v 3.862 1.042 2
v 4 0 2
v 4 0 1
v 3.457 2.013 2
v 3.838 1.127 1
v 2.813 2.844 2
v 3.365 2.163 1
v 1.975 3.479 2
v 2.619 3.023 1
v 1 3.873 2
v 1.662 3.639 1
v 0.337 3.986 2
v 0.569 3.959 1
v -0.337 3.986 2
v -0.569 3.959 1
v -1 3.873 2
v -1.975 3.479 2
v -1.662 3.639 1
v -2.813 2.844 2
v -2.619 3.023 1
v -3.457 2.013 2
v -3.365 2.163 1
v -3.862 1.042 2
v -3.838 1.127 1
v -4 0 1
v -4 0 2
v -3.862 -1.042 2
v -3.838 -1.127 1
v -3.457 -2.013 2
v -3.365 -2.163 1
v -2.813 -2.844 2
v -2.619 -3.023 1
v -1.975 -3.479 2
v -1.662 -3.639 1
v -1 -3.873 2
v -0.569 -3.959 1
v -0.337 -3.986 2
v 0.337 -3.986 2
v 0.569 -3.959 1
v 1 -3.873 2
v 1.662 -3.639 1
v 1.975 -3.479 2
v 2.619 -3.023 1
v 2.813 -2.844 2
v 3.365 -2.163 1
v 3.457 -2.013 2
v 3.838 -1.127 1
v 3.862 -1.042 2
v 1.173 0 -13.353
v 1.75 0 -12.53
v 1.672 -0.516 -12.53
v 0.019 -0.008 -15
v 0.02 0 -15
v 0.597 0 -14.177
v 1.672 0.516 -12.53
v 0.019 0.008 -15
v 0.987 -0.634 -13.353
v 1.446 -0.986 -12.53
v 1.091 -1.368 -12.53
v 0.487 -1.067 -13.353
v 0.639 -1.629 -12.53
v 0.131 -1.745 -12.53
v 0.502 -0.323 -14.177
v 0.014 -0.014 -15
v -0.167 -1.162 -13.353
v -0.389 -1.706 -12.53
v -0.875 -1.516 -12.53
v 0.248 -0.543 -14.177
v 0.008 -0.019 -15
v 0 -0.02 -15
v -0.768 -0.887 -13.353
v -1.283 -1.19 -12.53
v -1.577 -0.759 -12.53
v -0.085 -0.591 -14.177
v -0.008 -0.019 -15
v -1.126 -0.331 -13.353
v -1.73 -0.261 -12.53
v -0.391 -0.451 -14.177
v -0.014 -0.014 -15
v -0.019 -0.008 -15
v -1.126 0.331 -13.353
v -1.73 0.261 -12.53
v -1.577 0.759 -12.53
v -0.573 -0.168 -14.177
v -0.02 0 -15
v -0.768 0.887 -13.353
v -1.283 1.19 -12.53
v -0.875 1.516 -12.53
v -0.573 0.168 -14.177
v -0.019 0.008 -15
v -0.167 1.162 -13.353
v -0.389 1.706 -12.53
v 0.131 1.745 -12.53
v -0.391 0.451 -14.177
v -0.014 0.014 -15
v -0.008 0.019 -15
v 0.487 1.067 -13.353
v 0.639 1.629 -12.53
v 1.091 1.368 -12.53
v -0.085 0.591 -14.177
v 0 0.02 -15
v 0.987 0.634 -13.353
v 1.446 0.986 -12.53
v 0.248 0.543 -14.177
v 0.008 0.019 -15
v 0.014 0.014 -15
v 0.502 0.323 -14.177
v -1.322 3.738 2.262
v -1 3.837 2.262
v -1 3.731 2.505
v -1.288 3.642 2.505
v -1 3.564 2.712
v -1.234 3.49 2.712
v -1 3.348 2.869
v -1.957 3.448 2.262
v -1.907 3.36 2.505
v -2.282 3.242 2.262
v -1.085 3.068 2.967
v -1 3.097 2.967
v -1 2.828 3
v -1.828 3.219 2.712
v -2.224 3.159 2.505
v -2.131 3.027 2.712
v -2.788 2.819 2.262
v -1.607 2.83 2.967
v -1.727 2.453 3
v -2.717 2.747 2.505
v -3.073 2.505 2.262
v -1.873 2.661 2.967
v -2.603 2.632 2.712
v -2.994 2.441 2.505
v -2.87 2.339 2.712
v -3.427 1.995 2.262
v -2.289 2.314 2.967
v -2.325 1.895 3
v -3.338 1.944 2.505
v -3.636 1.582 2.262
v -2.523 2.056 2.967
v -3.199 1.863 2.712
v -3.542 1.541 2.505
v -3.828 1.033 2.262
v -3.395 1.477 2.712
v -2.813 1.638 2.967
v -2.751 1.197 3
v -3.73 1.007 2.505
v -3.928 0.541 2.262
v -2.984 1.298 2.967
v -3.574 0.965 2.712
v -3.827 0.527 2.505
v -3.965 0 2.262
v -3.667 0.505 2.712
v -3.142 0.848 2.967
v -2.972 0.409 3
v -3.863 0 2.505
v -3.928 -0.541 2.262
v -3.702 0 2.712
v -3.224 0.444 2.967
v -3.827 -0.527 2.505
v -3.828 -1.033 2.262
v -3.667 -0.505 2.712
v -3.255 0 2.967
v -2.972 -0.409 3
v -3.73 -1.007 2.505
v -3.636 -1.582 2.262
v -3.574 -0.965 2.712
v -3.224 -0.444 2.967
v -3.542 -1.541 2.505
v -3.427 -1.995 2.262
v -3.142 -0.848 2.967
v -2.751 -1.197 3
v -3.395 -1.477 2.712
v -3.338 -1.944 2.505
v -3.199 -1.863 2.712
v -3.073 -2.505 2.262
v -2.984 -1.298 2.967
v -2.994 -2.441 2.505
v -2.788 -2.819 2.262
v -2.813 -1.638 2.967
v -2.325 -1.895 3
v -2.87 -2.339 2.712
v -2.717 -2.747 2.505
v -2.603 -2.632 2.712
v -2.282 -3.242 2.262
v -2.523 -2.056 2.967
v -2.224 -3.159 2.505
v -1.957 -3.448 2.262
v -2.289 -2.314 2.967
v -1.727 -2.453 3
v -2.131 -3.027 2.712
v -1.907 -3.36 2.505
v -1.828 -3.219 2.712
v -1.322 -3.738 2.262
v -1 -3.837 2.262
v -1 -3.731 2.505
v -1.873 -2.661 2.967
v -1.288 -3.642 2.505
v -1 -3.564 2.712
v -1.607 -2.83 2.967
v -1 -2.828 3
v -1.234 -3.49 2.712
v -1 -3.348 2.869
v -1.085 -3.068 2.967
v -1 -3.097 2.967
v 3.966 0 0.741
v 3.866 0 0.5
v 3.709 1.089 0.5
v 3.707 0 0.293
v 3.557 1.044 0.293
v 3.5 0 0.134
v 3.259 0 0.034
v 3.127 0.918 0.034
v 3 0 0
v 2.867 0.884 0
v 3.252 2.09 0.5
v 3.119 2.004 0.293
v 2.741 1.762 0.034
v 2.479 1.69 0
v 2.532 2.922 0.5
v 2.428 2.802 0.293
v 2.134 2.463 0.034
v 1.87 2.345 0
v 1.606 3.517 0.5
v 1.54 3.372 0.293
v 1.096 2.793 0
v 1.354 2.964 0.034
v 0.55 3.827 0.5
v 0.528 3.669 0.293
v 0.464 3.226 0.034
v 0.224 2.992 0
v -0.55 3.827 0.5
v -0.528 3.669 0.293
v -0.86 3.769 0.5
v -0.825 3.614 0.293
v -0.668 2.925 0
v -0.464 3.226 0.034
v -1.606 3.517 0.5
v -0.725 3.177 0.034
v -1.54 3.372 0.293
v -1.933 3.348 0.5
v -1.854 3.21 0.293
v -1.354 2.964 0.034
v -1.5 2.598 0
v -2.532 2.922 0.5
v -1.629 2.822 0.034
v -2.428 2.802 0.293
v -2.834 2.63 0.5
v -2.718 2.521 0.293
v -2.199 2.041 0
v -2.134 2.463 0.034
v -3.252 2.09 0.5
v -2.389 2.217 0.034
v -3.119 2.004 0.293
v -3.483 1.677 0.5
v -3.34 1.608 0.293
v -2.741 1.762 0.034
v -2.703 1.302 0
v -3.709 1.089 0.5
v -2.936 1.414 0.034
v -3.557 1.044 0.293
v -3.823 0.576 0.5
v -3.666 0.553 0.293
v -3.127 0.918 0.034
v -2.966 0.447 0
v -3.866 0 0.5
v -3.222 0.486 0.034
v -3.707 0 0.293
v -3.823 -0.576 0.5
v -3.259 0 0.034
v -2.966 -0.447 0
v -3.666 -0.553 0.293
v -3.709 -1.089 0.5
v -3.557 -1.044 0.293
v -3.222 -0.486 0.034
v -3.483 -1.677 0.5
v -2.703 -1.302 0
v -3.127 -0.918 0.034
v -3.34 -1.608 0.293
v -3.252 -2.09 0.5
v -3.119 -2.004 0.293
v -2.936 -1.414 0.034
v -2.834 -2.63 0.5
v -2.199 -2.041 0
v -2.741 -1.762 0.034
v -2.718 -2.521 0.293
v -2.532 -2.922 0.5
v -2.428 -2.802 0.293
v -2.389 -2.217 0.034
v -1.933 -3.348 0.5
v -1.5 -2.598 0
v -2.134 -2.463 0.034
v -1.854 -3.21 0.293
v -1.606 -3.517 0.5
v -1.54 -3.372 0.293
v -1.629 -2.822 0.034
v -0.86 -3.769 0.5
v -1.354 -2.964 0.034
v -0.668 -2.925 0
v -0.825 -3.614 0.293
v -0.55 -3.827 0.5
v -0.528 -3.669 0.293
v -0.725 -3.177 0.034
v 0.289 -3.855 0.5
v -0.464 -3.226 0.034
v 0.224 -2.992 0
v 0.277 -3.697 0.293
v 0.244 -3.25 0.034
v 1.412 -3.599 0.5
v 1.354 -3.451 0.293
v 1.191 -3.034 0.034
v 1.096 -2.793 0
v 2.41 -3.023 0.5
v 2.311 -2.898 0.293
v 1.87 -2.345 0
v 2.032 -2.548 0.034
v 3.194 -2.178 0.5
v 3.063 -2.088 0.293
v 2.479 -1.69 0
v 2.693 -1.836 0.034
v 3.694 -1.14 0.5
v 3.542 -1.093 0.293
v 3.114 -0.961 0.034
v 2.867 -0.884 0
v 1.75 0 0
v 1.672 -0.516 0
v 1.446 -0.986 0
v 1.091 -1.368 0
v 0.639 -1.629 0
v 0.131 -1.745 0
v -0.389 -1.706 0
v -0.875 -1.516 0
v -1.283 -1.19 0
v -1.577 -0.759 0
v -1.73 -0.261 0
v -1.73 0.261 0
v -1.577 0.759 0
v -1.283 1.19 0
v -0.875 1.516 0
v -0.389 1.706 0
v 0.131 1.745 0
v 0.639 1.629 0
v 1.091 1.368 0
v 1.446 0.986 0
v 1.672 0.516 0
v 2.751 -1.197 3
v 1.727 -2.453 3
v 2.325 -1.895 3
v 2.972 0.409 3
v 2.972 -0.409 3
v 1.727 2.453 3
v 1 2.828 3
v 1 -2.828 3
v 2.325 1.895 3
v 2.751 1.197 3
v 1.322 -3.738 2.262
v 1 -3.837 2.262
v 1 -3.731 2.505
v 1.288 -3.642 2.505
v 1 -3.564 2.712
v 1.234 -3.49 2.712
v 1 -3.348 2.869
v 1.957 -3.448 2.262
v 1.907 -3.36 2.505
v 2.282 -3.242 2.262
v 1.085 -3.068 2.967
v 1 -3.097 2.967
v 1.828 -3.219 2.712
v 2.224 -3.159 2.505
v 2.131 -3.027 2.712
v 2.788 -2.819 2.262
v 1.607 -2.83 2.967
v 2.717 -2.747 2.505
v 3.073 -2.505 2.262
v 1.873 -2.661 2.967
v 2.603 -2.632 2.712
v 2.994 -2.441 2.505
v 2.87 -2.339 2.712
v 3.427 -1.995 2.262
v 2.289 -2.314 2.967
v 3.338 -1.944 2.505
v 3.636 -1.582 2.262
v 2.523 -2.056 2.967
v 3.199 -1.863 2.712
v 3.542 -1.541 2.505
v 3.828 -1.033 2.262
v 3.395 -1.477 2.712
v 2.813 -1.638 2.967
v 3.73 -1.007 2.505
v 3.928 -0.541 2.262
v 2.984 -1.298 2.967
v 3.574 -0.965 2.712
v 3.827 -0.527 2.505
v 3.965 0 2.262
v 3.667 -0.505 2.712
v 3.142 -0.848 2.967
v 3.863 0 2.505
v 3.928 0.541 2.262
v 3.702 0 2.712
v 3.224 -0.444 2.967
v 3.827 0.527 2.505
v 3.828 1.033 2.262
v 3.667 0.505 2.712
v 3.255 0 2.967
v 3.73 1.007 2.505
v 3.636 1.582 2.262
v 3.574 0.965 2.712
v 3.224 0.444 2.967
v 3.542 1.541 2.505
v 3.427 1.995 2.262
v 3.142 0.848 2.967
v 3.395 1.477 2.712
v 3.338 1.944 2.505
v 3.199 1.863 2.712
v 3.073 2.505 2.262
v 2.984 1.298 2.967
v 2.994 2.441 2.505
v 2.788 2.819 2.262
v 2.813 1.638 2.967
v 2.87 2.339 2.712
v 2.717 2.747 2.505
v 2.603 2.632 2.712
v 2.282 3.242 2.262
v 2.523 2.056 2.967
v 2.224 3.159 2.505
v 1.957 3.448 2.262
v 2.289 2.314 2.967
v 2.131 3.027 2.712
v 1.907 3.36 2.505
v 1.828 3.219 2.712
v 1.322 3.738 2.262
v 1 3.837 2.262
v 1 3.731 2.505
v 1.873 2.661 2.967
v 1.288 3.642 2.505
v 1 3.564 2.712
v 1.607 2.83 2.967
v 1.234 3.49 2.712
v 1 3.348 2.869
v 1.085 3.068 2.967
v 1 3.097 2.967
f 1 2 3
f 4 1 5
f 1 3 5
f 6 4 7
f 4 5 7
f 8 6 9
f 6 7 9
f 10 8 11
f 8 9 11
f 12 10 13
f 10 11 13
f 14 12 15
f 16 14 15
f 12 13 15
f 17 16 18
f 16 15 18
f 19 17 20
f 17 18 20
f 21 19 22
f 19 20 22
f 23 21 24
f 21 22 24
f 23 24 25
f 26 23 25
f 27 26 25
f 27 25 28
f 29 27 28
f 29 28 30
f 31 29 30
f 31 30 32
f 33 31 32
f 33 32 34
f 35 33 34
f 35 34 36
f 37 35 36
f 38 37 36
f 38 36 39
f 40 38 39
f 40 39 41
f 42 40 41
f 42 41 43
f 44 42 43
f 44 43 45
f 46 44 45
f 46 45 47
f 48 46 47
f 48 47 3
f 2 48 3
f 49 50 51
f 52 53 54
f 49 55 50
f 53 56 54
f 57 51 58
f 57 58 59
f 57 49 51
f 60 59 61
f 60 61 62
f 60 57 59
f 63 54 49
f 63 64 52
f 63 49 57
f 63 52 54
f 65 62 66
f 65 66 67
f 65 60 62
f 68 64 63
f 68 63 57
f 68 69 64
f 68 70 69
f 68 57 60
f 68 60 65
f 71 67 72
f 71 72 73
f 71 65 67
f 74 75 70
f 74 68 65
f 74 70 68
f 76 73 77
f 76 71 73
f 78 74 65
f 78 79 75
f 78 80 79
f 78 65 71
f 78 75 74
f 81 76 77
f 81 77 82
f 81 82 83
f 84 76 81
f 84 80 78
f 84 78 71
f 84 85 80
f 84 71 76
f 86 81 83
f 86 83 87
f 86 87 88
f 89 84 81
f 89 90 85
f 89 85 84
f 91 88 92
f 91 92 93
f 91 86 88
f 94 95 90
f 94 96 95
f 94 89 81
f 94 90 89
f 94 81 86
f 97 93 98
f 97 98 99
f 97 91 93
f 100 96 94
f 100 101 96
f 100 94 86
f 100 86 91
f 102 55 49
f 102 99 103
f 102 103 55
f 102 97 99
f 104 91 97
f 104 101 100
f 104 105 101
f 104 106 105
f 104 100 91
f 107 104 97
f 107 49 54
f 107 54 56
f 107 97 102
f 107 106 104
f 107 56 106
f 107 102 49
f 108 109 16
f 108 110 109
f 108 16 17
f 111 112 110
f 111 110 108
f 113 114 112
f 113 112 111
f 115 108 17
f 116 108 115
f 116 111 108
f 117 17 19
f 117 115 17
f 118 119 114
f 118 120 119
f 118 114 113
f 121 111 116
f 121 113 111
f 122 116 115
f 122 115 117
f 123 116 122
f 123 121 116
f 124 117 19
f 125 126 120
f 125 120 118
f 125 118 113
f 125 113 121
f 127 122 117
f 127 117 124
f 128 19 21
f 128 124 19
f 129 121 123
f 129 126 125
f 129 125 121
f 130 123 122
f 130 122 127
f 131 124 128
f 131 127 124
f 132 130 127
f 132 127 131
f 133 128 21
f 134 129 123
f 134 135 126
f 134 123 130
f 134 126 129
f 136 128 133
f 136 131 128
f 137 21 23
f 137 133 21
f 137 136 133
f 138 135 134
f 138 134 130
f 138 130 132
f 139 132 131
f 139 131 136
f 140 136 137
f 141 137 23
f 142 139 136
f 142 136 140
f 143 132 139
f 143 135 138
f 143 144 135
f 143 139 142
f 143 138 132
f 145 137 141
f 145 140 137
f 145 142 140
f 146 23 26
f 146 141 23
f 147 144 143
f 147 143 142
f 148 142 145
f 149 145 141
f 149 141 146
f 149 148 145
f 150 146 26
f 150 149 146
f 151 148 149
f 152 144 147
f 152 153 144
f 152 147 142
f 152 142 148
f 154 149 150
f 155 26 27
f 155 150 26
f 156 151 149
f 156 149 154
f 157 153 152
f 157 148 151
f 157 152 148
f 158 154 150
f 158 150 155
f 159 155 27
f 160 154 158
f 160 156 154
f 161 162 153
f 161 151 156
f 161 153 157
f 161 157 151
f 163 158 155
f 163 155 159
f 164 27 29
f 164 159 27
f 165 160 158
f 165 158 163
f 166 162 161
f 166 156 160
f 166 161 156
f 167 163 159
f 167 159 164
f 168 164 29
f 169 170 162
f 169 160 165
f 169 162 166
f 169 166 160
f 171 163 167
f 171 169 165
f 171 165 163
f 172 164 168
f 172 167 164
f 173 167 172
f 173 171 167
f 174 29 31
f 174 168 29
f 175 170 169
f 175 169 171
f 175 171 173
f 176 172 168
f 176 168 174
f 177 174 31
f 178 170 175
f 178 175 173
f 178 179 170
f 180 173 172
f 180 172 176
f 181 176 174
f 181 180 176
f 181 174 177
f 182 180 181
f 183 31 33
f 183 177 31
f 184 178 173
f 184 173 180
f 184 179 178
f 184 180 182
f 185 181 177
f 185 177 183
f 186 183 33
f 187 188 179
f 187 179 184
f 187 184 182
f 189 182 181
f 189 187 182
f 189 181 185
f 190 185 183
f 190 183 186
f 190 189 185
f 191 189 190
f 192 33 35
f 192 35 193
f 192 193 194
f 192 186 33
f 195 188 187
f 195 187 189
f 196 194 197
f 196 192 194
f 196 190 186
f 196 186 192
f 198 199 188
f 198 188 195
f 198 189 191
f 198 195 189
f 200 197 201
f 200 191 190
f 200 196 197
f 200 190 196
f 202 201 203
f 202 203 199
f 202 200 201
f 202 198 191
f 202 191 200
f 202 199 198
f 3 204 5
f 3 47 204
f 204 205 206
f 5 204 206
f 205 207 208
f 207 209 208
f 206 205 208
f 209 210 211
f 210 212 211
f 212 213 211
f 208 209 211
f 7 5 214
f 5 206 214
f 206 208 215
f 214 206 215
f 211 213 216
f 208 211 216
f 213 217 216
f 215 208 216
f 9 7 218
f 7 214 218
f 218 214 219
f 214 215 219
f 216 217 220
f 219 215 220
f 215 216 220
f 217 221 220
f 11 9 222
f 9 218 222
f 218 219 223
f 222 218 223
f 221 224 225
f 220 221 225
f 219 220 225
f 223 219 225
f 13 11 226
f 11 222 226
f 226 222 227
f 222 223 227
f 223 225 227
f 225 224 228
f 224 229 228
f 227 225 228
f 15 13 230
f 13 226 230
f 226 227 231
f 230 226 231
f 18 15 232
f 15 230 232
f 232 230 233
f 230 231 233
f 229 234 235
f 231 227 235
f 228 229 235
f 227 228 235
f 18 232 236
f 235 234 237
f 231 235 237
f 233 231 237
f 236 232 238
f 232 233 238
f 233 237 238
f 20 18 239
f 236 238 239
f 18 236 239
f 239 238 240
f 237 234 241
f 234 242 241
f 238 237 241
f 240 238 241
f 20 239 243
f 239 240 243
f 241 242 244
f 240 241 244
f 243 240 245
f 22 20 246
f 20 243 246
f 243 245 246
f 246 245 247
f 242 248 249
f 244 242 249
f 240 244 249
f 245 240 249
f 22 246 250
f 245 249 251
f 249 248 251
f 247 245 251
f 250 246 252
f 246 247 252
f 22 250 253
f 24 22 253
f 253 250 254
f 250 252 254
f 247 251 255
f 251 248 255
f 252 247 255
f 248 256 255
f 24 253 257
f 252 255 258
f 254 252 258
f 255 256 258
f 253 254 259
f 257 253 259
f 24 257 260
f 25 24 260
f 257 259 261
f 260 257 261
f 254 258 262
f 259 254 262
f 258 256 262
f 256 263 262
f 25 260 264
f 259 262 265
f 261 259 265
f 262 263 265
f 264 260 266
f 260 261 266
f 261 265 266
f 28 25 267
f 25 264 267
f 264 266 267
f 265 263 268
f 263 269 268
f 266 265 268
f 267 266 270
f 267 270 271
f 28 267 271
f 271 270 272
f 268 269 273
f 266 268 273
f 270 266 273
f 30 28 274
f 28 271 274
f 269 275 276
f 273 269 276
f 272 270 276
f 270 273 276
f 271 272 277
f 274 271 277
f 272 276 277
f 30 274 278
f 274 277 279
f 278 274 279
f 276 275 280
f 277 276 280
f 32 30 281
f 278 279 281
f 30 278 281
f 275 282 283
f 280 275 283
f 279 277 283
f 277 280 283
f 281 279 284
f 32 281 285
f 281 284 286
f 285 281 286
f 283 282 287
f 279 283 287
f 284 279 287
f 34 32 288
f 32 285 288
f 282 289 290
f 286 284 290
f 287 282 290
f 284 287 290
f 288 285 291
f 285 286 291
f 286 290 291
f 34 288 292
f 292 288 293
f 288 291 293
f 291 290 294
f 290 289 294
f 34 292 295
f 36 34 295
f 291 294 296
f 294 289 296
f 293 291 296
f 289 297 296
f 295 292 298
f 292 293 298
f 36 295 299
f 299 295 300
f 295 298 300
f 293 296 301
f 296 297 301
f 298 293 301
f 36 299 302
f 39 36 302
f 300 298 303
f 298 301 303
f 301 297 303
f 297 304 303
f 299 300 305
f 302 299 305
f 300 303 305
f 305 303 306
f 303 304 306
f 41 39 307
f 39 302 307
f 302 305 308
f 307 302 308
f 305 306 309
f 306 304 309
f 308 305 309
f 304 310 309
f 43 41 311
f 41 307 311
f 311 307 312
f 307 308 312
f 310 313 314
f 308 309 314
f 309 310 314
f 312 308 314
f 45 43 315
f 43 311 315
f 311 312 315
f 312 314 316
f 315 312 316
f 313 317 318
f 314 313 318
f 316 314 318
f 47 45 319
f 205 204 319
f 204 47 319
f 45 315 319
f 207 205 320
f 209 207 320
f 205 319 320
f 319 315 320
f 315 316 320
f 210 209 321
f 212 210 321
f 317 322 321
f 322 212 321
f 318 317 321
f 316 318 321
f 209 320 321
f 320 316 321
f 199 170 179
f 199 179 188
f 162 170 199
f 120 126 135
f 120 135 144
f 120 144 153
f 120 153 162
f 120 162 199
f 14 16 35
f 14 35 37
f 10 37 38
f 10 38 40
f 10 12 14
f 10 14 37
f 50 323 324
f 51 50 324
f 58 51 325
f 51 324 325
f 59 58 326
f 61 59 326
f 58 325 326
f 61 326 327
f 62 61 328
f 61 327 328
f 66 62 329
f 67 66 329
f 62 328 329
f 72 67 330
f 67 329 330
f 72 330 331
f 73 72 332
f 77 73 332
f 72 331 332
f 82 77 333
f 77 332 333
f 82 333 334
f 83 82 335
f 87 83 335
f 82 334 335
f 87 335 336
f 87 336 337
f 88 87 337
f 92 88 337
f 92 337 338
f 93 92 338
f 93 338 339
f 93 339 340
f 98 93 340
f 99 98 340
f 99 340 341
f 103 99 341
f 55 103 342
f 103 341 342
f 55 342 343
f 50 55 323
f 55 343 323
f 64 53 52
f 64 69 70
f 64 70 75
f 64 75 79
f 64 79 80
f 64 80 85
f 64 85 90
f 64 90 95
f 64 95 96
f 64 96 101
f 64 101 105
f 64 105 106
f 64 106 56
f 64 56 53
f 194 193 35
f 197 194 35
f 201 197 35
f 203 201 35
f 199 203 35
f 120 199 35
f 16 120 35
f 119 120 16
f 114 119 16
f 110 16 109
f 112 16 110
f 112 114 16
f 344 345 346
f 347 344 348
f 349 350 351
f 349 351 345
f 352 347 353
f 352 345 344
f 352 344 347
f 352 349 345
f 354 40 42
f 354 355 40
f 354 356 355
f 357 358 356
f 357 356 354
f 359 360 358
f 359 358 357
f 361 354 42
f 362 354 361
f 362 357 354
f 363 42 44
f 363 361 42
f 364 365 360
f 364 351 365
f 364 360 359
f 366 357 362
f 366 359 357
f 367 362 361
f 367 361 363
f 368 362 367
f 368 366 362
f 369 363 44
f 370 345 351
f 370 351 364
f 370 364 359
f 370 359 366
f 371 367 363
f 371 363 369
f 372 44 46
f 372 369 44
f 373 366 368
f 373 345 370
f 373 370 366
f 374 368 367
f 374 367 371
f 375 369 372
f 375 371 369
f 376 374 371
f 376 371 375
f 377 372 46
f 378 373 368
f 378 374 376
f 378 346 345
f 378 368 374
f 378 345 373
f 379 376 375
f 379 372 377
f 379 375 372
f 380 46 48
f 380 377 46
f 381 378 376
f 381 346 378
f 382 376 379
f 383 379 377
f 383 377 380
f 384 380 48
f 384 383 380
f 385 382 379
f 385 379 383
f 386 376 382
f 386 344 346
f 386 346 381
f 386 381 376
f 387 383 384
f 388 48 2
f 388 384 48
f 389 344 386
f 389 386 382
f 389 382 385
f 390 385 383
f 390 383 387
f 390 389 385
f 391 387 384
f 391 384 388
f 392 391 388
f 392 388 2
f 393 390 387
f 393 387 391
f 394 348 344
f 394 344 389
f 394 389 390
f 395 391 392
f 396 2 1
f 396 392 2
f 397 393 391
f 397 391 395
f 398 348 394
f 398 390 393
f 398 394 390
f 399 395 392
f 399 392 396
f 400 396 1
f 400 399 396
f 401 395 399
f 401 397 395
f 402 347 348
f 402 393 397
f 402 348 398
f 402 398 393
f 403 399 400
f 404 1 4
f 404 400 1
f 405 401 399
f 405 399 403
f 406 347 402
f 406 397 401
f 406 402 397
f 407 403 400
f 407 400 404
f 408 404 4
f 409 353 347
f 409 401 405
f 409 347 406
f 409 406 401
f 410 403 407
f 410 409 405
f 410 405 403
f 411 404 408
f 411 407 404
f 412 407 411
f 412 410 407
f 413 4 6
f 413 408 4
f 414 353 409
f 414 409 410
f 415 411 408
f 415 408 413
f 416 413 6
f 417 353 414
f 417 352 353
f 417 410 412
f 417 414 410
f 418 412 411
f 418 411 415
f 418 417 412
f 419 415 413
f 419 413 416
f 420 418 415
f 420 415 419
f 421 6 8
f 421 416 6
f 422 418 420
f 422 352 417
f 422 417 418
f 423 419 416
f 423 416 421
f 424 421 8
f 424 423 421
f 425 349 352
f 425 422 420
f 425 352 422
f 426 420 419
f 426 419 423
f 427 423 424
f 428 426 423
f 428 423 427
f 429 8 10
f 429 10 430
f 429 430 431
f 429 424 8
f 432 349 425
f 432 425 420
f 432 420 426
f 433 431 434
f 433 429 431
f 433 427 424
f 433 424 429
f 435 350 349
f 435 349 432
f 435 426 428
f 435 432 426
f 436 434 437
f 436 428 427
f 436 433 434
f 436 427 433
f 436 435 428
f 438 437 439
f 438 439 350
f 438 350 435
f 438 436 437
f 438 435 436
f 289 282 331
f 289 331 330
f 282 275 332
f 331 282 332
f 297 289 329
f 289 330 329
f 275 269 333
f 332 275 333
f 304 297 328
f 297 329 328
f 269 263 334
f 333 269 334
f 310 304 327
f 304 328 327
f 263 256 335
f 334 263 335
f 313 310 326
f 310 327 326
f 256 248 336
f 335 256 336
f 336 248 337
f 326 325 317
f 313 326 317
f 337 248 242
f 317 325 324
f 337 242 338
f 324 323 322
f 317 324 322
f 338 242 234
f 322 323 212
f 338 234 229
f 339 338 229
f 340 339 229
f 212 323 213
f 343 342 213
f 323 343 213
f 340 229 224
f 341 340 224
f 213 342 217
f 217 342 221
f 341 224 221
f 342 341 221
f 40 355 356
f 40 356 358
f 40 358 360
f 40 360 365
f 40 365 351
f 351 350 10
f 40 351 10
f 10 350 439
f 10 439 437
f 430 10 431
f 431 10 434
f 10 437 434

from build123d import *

# Parameters (mm, degrees)
CROQUIS1_R              = 4
SALIENTE_EXTRUIR1_DEPTH = 3
REDONDEO1_R             = 1
CROQUIS2_W              = 2
CROQUIS2_H              = 10.515557436
CORTAR_EXTRUIR1_DEPTH   = 1
CROQUIS3_R              = 1.75
SALIENTE_EXTRUIR2_DEPTH = 15
CHAFL_N1_SIZE           = 2.47
CHAFL_N1_SIZE2          = 1.729512619


with BuildPart() as part:
    # Croquis1 → Saliente-Extruir1 (new body)
    with BuildSketch(Plane.XY):
        Circle(CROQUIS1_R)
    extrude(amount=SALIENTE_EXTRUIR1_DEPTH)

    # Redondeo1
    redondeo1_edges = [part.edges().sort_by_distance(p)[0] for p in [
        (-4, 0, 0),
        (-4, 0, 3),
    ]]
    fillet(redondeo1_edges, radius=REDONDEO1_R)

    # Croquis2 → Cortar-Extruir1 (cut)
    with BuildSketch(Plane.XY.offset(3)):
        Rectangle(CROQUIS2_W, CROQUIS2_H)
    extrude(amount=-CORTAR_EXTRUIR1_DEPTH, mode=Mode.SUBTRACT)

    # Croquis3 → Saliente-Extruir2 (add)
    with BuildSketch(Plane(origin=(0, 0, 0), x_dir=(-1, 0, 0), z_dir=(0, 0, -1))):
        with Locations(Location((0, 0, 0), (0, 0, 180))):
            Circle(CROQUIS3_R)
    extrude(amount=SALIENTE_EXTRUIR2_DEPTH)

    # Chaflán1
    chafl_n1_edges = [part.edges().sort_by_distance(p)[0] for p in [
        (-1.75, 0, -15),
    ]]
    chafl_n1_side = [part.faces().sort_by_distance(p)[0] for p in [
        (-1.75, 0, -7.5),
    ]]
    chamfer(chafl_n1_edges, length=CHAFL_N1_SIZE, length2=CHAFL_N1_SIZE2, reference=chafl_n1_side[0])


solid = part.part
